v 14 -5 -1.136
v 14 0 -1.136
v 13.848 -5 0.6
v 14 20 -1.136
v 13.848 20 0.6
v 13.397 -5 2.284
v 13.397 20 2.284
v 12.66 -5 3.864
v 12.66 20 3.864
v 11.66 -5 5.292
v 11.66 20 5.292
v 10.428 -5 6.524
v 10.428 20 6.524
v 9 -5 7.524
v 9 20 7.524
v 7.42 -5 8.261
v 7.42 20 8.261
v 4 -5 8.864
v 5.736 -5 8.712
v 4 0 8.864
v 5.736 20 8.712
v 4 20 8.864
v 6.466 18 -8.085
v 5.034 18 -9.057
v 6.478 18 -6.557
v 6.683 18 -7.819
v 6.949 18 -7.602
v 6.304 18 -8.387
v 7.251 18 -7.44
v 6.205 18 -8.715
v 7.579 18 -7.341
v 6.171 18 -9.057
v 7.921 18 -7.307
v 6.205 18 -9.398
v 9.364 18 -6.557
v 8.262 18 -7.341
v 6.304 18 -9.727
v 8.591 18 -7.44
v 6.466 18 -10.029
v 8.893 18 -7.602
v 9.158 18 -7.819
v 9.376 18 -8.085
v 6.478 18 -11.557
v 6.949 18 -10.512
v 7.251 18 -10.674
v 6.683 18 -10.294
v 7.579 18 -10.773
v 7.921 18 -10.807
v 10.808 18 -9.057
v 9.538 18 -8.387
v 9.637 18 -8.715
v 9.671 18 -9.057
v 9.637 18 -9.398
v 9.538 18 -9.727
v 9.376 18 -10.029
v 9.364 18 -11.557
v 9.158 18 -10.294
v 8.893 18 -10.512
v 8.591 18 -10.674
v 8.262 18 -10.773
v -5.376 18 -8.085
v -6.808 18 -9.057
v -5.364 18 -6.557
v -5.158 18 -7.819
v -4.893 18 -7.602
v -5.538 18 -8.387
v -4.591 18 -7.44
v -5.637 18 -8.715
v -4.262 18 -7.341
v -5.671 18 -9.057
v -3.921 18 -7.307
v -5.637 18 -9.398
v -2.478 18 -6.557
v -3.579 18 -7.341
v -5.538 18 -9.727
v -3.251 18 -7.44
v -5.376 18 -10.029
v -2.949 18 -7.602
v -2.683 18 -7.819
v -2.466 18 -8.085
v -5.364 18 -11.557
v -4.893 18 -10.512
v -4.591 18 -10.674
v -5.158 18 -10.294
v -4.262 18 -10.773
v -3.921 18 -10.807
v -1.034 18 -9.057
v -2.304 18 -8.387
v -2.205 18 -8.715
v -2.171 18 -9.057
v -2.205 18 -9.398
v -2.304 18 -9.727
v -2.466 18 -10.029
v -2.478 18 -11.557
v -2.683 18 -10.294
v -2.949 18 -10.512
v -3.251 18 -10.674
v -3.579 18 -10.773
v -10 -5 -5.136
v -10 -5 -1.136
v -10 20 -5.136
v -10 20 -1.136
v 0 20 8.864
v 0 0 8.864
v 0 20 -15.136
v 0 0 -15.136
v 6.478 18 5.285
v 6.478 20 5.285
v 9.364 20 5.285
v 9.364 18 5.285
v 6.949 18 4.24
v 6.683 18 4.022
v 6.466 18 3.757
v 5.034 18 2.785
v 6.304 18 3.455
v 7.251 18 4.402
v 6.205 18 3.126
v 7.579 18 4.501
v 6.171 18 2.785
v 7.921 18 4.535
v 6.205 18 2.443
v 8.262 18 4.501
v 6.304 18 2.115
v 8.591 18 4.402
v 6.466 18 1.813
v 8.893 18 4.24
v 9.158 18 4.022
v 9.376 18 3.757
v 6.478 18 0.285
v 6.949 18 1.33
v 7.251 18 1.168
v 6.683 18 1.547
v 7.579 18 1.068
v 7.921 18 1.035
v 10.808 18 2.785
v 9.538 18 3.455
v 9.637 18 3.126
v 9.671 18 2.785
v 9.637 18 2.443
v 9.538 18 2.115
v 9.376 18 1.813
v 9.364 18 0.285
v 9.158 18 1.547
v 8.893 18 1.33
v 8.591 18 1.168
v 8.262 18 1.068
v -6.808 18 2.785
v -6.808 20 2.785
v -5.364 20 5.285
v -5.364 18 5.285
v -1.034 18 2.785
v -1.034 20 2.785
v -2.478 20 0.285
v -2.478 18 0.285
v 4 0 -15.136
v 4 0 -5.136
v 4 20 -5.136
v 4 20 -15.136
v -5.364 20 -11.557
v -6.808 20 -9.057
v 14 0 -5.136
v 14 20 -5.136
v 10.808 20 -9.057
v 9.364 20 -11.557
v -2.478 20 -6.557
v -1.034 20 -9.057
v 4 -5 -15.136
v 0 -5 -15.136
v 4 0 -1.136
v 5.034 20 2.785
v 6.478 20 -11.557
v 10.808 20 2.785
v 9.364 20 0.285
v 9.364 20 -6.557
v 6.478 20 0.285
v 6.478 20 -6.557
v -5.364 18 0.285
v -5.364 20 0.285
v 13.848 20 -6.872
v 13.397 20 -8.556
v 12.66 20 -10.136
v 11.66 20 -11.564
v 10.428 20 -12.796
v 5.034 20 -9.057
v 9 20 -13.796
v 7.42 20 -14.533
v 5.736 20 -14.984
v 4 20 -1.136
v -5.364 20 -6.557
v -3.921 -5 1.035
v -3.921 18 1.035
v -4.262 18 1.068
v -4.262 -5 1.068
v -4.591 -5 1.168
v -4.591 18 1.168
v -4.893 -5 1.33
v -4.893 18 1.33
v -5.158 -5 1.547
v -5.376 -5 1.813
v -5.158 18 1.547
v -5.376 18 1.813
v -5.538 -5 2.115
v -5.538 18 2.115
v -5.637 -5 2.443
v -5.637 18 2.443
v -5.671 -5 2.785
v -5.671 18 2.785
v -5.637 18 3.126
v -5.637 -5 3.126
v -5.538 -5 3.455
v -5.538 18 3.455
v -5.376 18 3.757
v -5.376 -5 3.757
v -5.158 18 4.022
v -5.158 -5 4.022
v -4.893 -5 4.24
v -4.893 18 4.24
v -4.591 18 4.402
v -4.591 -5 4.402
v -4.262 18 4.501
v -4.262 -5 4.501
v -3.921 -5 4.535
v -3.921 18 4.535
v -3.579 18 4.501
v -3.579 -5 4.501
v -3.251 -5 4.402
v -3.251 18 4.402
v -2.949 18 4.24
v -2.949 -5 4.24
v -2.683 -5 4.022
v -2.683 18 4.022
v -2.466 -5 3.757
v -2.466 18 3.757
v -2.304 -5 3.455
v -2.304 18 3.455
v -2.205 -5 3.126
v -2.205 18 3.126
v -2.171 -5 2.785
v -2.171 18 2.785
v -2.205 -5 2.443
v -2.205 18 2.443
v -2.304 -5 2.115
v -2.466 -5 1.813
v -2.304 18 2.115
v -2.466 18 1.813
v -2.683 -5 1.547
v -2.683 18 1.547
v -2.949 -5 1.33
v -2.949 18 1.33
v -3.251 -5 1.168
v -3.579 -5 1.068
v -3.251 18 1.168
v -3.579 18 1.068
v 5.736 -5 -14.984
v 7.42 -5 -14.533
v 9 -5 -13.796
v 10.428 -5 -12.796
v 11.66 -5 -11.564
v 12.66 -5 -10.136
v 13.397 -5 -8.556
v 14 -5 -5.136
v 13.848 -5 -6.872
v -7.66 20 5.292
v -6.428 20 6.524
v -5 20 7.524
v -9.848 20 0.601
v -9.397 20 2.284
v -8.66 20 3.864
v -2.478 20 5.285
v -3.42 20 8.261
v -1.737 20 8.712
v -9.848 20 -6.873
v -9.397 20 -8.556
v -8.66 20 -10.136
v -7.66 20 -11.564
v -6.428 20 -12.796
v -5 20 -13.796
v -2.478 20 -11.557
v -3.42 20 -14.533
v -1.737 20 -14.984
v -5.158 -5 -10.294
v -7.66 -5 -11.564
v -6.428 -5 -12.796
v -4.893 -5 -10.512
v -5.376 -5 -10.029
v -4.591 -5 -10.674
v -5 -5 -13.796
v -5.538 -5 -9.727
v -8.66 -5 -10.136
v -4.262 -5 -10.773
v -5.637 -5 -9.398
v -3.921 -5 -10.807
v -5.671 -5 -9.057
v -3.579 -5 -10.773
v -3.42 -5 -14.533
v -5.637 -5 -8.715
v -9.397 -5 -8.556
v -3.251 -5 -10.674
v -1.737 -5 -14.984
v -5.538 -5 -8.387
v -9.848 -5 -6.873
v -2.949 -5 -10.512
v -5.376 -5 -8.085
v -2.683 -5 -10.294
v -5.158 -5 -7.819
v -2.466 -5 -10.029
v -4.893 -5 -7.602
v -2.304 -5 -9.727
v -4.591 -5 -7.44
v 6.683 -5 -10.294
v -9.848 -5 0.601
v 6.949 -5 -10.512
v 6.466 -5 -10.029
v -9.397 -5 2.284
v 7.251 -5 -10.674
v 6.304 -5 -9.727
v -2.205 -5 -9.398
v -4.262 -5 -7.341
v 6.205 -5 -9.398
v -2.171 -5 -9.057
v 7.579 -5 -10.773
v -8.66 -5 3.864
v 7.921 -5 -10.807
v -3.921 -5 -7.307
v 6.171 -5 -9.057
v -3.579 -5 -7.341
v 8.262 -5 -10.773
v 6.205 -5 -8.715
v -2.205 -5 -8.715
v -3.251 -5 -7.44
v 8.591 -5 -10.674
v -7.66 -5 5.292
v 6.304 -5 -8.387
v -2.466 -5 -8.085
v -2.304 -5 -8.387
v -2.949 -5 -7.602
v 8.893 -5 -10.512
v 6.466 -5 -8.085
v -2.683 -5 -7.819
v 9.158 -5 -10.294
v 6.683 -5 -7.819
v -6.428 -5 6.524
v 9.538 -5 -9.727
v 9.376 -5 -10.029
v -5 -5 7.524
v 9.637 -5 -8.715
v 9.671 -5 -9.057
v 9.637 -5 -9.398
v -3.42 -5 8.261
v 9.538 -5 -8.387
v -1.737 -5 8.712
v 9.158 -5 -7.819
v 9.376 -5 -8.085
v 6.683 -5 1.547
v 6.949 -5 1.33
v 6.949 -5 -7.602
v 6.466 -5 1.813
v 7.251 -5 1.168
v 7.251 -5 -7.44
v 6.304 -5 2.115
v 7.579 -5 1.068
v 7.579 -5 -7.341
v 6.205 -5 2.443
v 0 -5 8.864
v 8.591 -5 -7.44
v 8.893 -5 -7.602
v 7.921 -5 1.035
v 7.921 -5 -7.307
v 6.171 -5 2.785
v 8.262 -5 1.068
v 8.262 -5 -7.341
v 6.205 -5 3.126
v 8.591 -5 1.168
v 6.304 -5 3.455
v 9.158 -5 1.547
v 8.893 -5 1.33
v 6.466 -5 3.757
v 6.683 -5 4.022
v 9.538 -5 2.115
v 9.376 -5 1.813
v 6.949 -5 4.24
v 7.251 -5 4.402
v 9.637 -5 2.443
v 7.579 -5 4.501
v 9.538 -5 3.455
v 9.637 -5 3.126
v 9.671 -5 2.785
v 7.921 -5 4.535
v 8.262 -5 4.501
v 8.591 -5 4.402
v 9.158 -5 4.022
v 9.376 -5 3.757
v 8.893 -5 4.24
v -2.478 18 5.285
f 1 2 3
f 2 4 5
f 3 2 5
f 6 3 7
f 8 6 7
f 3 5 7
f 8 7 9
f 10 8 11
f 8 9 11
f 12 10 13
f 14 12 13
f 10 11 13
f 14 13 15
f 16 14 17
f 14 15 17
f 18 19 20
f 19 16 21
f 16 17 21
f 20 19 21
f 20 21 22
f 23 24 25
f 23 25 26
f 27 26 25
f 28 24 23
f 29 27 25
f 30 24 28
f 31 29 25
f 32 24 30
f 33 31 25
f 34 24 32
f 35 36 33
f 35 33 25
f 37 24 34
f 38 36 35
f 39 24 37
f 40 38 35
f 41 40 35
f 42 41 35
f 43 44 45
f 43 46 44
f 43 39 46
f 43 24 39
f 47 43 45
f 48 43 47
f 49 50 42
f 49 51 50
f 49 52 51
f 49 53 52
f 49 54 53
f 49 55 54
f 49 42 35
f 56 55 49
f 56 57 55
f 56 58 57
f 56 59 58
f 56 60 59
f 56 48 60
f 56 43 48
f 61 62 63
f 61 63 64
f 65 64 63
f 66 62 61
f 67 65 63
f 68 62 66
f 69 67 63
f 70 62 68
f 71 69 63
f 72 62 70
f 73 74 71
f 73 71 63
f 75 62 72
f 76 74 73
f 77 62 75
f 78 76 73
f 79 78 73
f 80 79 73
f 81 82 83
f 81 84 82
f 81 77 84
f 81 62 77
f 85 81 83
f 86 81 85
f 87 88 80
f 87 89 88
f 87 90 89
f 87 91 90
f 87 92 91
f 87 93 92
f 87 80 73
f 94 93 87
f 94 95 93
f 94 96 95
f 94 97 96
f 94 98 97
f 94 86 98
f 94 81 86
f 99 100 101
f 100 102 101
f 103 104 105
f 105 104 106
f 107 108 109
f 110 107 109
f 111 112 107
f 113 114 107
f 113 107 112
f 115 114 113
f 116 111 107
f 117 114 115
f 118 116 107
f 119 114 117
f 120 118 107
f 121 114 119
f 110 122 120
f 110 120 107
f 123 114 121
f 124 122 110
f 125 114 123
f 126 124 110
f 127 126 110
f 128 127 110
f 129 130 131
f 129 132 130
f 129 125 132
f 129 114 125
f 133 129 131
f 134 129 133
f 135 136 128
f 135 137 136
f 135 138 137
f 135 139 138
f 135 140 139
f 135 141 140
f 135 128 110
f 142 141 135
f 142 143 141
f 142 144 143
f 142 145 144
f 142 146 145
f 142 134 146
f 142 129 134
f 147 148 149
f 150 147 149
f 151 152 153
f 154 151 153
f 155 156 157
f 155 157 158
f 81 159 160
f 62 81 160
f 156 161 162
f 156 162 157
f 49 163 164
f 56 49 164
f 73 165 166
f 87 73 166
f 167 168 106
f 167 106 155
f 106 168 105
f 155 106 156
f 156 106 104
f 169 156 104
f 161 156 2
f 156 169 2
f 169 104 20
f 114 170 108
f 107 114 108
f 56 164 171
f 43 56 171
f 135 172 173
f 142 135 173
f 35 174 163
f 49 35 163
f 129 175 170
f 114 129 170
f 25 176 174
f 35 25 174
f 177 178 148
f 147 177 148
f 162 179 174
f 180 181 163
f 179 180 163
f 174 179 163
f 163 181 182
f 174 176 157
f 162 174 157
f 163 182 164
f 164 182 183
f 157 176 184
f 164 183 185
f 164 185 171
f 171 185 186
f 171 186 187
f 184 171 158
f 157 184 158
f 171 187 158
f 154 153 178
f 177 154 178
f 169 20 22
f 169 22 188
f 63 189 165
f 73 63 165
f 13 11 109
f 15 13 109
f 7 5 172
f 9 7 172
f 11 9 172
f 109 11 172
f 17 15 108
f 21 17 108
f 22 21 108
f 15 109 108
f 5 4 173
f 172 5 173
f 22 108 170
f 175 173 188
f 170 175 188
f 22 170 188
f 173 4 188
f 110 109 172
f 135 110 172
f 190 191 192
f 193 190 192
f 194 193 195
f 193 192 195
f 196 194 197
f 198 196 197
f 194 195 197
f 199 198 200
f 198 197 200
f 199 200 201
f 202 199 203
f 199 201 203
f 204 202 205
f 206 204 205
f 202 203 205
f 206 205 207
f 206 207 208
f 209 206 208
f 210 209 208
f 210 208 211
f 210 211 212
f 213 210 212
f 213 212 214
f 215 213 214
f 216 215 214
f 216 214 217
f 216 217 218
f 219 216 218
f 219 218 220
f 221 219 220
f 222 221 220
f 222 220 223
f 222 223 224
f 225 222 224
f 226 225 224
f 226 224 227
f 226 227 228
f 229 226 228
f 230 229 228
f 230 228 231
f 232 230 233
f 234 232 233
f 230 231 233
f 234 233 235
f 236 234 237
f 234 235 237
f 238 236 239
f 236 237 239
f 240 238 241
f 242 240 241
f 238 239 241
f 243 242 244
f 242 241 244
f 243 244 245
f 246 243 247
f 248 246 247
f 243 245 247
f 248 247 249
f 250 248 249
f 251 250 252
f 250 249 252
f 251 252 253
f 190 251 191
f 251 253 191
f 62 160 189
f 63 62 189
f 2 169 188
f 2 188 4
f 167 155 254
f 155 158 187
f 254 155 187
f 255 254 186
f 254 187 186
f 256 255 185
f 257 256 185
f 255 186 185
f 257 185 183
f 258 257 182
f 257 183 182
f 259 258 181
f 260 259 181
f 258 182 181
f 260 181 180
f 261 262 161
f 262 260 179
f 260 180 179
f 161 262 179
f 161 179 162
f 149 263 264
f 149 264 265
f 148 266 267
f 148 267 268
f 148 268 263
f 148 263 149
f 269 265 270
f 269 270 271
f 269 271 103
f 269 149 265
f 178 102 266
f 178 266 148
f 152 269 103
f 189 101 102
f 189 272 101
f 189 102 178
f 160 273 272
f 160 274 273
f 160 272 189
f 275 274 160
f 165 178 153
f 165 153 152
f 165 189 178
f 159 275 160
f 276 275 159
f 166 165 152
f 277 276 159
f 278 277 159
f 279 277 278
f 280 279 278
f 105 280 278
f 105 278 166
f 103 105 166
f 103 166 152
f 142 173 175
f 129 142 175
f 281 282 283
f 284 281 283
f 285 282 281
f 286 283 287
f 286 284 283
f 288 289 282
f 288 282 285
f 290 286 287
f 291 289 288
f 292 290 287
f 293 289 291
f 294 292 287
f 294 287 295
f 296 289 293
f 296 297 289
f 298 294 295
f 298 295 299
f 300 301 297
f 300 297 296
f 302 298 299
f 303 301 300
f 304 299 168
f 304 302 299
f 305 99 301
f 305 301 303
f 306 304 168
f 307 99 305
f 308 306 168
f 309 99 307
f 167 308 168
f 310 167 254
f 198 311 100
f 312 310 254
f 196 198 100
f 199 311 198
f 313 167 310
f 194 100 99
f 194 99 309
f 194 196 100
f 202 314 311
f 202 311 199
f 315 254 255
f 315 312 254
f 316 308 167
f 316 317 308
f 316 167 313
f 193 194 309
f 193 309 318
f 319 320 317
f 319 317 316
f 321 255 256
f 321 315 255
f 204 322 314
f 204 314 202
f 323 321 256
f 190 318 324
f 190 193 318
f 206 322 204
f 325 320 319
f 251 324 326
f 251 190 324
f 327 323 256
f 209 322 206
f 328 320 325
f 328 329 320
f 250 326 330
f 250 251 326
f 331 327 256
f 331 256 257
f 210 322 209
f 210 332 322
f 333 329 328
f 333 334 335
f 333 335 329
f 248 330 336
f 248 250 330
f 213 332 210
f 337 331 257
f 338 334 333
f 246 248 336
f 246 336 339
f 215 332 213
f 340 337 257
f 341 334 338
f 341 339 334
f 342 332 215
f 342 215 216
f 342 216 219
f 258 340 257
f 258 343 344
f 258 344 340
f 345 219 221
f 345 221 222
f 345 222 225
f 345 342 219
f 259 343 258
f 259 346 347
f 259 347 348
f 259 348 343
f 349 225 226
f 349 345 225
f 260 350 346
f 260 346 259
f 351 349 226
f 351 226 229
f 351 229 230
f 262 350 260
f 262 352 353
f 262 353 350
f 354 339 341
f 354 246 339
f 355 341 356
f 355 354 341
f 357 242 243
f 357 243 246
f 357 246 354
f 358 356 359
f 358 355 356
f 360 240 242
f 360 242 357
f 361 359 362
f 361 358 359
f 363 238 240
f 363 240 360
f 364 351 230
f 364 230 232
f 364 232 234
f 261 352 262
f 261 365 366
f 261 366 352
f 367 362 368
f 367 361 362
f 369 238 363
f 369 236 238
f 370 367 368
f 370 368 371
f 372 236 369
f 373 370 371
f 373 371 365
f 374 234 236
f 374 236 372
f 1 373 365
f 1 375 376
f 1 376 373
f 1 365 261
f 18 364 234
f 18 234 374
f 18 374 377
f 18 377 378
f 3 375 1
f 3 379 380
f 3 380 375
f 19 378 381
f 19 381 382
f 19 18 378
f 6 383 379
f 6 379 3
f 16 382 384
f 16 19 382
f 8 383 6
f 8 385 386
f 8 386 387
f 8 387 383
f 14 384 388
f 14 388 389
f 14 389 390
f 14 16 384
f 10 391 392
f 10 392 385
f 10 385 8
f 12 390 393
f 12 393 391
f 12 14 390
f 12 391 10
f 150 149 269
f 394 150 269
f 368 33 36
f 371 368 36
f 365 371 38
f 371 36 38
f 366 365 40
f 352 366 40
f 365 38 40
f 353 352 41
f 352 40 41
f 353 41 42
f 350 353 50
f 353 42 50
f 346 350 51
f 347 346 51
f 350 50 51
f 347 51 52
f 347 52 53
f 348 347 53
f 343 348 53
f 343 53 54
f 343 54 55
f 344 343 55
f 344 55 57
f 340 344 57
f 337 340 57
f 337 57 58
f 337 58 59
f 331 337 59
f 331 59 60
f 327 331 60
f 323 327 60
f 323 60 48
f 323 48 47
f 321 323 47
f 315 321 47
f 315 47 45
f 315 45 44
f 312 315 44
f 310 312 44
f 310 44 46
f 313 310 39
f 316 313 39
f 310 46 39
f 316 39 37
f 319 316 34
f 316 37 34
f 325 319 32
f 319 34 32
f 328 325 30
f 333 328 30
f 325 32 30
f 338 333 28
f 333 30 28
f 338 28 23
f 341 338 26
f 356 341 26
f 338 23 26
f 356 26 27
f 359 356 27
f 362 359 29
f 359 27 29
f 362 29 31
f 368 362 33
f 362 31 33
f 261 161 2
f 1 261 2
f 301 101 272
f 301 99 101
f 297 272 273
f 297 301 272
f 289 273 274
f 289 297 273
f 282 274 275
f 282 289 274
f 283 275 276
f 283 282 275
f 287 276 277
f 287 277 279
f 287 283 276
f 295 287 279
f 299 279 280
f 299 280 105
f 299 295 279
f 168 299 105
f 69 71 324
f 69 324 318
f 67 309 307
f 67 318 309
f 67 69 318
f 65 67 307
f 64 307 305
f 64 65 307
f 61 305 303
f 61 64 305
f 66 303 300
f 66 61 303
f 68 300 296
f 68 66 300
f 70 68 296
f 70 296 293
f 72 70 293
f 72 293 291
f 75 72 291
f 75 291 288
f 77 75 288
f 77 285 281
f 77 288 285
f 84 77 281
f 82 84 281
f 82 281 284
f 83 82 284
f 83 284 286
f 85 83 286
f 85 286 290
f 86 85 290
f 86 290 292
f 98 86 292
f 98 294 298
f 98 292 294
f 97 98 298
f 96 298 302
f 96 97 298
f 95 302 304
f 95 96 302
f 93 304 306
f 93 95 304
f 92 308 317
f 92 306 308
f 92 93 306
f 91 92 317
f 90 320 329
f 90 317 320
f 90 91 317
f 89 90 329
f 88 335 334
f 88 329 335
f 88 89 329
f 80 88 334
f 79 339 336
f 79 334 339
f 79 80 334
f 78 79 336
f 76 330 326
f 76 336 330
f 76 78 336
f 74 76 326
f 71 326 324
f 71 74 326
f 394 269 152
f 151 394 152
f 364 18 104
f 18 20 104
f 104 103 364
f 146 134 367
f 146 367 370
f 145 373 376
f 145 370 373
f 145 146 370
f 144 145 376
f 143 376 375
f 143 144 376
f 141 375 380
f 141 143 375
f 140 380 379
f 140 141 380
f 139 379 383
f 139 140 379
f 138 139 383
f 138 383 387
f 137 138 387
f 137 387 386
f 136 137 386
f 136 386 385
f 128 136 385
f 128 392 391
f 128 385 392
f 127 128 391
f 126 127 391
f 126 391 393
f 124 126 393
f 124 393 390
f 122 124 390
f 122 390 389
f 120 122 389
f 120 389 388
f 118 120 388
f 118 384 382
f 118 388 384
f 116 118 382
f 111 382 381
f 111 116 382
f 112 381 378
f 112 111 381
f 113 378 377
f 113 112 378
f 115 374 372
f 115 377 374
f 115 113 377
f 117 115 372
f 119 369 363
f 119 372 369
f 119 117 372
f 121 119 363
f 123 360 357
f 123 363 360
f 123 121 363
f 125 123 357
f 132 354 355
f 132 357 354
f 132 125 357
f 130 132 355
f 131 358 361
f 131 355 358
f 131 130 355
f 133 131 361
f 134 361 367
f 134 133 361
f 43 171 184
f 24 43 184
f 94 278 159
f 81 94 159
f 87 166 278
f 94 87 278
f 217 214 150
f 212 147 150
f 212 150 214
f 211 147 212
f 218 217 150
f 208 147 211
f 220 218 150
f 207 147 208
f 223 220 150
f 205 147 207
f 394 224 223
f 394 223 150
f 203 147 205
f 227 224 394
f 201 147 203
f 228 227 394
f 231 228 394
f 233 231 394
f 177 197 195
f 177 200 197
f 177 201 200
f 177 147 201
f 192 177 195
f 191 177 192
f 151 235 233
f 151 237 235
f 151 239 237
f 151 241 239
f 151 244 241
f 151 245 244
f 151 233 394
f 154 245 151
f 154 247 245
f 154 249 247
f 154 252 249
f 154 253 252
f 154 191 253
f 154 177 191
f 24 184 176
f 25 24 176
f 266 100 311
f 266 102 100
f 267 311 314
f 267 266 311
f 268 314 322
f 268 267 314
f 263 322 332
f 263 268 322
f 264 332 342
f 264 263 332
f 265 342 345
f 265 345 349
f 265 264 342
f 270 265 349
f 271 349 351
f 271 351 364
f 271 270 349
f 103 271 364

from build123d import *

# Parameters (mm, degrees)
SKETCH1_W               = 10
SKETCH1_H               = 24
BOSS_EXTRUDE1_DEPTH     = 20
BOSS_EXTRUDE1_2_DEPTH   = 20
BOSS_EXTRUDE1_3_DEPTH   = 20
BOSS_EXTRUDE2_DEPTH     = 5
FILLET1_R               = 10
SKETCH3_R               = 1.75
CUT_EXTRUDE1_DEPTH      = 29
MIRROR2_COPY_1_SKETCH_R = 1.75
MIRROR2_COPY_1_DEPTH    = 29
CUT_EXTRUDE2_DEPTH      = 2


with BuildPart() as part:
    # Sketch1 → Boss-Extrude1 (new body)
    with BuildSketch(Plane(origin=(0, 0, 0), x_dir=(1, 0, 0), z_dir=(0, 1, 0))):
        with Locations((-5, 3.136015275)):
            Rectangle(SKETCH1_W, SKETCH1_H)
    extrude(amount=BOSS_EXTRUDE1_DEPTH)



with BuildPart() as body_2:
    # Sketch1 → Boss-Extrude1 2 (new body)
    with BuildSketch(Plane(origin=(0, 0, 0), x_dir=(1, 0, 0), z_dir=(0, 1, 0))):
        with BuildLine():
            ThreePointArc((14, 1.136015275), (11.071067812, -5.935052537), (4, -8.863984725))
            Line((4, -8.863984725), (4, 1.136015275))
            Line((4, 1.136015275), (14, 1.136015275))
        make_face()
    extrude(amount=BOSS_EXTRUDE1_2_DEPTH)


with BuildPart() as body_3:
    # Sketch1 → Boss-Extrude1 3 (new body)
    with BuildSketch(Plane(origin=(0, 0, 0), x_dir=(1, 0, 0), z_dir=(0, 1, 0))):
        with BuildLine():
            ThreePointArc((4, 15.136015275), (11.071067812, 12.207083087), (14, 5.136015275))
            Line((14, 5.136015275), (4, 5.136015275))
            Line((4, 5.136015275), (4, 15.136015275))
        make_face()
    extrude(amount=BOSS_EXTRUDE1_3_DEPTH)


with BuildPart() as part_1:
    add(part.part)

    add(body_2.part)  # Boss-Extrude2 merges body 2

    add(body_3.part)  # Boss-Extrude2 merges body 3
    # Sketch2 → Boss-Extrude2 (add)
    with BuildSketch(Plane.XZ):
        with BuildLine():
            Line((-10, 8.863984725), (-10, -15.136015275))
            Line((-10, -15.136015275), (0, -15.136015275))
            Line((0, -15.136015275), (4, -15.136015275))
            ThreePointArc((4, -15.136015275), (11.071067812, -12.207083087), (14, -5.136015275))
            Line((14, -5.136015275), (14, -1.136015275))
            ThreePointArc((14, -1.136015275), (11.071067812, 5.935052537), (4, 8.863984725))
            Line((4, 8.863984725), (0, 8.863984725))
            Line((0, 8.863984725), (-10, 8.863984725))
        make_face()
    extrude(amount=BOSS_EXTRUDE2_DEPTH)

    # Fillet1
    fillet1_edges = [part_1.edges().sort_by_distance(p)[0] for p in [
        (-10, 7.5, 8.863984725),
        (-10, 7.5, -15.136015275),
    ]]
    fillet(fillet1_edges, radius=FILLET1_R - 0.0001)  # a hair under: the kernel refuses the full size

    # Sketch3 → Cut-Extrude1 (cut)
    with BuildSketch(Plane(origin=(0, 20, 0), x_dir=(1, 0, 0), z_dir=(0, 1, 0))):
        with Locations(Location((7.920878707, 9.056893982, 0), (0, 0, 270))):
            Circle(SKETCH3_R)
    cut_extrude1 = extrude(amount=-CUT_EXTRUDE1_DEPTH, mode=Mode.SUBTRACT)

    # Mirror1: Cut-Extrude1 across plane
    add(cut_extrude1.mirror(Plane.XY.offset(-3.136015275)), mode=Mode.SUBTRACT)

    # Mirror2: Cut-Extrude1 across plane
    add(cut_extrude1.mirror(Plane(origin=(2, 0, 0), x_dir=(0, 0, 1), z_dir=(1, 0, 0))), mode=Mode.SUBTRACT)

    # Mirror2 copy 1 sketch → Mirror2 copy 1 (cut)
    with BuildSketch(Plane(origin=(4, 20, -6.27203055), x_dir=(-1, 0, 0), z_dir=(0, 1, 0))):
        with Locations(Location((7.920878707, 9.056893982, 0), (0, 0, 270))):
            Circle(MIRROR2_COPY_1_SKETCH_R)
    extrude(amount=-MIRROR2_COPY_1_DEPTH, mode=Mode.SUBTRACT)

    # Sketch4 → Cut-Extrude2 (cut)
    with BuildSketch(Plane(origin=(0, 20, 0), x_dir=(1, 0, 0), z_dir=(0, 1, 0))):
        Polygon((10.807630053, 9.056893982), (9.36425438, 11.556893982), (6.477503035, 11.556893982), (5.034127362, 9.056893982), (6.477503035, 6.556893982), (9.36425438, 6.556893982), align=None)
        Polygon((10.807630053, -2.784863433), (9.36425438, -0.284863433), (6.477503035, -0.284863433), (5.034127362, -2.784863433), (6.477503035, -5.284863433), (9.36425438, -5.284863433), align=None)
        Polygon((-6.807630053, -2.784863433), (-5.36425438, -5.284863433), (-2.477503035, -5.284863433), (-1.034127362, -2.784863433), (-2.477503035, -0.284863433), (-5.36425438, -0.284863433), align=None)
        Polygon((-6.807630053, 9.056893982), (-5.36425438, 6.556893982), (-2.477503035, 6.556893982), (-1.034127362, 9.056893982), (-2.477503035, 11.556893982), (-5.36425438, 11.556893982), align=None)
    extrude(amount=-CUT_EXTRUDE2_DEPTH, mode=Mode.SUBTRACT)


solid = part_1.part
